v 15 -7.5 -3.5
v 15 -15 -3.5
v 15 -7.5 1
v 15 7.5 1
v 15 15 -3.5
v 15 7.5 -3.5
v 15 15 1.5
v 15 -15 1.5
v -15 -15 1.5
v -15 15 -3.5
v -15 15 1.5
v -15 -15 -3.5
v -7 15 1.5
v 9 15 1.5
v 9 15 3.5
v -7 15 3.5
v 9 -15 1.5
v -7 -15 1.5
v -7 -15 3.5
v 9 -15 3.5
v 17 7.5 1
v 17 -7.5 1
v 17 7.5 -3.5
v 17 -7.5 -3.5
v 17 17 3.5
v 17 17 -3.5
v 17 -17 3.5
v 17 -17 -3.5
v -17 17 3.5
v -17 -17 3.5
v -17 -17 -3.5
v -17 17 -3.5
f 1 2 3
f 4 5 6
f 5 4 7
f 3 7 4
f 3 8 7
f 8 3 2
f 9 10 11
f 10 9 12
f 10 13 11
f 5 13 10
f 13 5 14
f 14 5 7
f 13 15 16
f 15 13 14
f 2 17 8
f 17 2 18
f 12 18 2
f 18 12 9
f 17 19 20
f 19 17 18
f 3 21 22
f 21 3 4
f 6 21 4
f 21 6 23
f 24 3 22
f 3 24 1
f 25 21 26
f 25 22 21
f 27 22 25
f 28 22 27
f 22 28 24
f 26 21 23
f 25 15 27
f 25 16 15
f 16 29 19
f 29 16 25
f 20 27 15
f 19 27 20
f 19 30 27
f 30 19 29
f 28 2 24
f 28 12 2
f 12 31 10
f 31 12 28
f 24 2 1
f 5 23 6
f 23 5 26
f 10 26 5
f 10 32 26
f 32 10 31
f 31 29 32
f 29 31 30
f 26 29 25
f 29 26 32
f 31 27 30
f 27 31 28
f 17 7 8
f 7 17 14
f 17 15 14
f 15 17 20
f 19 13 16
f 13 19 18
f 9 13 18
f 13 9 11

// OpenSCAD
length = 30;
width = 30;
depth = 5;
prodWidth = 2;

outerLength = length + (prodWidth*2);
outerWidth = width + (prodWidth*2);
outerDepth = depth + (prodWidth);

module main()  {  
   casing_offset = 1; 
    
    //sub cover
                translate([12, 0, depth/2]) {
                    cube([6, outerWidth, prodWidth], true); 
                } 
                
                 translate([-11, 0, depth/2]) {
                    cube([8, outerWidth, prodWidth], true); 
                } 
                
     module lid() {   
        ///  lid
        difference() {
            union() {
                 
                
                //backing inner
                translate([0, 0, prodWidth-depth]) {
                    cube([length, width, prodWidth*2], true);  
                }  
                //backing
                translate([0, 0, -depth]) {
                    cube([outerLength, outerWidth, prodWidth], true); 
                } 
            }
           
        }
    }
    
    module case() {    
        difference() {
            union() {
                
                //main
                cube([outerLength, outerWidth, outerDepth], true);  
                
                
                
            }
            
            union() {
                
                // logo
//                translate([50, prodWidth+15.5, prodWidth+height+4]) {
//                    scale([0.08, 0.08, 0.01]) {
//                        surface(file = "falcon.png", center = true, invert = true);
//                    }
//                }
                
                // cavity
                translate([0, 0, 0]) {
                    cube([length, width, depth+5], true);  
                }  
                
                translate([10, 0, -4]) {
                    cube([length+10, width/2, depth+5], true);  
                }  
                
            }
            
        }
    }
   

   case();
   //lid();

}

main();
